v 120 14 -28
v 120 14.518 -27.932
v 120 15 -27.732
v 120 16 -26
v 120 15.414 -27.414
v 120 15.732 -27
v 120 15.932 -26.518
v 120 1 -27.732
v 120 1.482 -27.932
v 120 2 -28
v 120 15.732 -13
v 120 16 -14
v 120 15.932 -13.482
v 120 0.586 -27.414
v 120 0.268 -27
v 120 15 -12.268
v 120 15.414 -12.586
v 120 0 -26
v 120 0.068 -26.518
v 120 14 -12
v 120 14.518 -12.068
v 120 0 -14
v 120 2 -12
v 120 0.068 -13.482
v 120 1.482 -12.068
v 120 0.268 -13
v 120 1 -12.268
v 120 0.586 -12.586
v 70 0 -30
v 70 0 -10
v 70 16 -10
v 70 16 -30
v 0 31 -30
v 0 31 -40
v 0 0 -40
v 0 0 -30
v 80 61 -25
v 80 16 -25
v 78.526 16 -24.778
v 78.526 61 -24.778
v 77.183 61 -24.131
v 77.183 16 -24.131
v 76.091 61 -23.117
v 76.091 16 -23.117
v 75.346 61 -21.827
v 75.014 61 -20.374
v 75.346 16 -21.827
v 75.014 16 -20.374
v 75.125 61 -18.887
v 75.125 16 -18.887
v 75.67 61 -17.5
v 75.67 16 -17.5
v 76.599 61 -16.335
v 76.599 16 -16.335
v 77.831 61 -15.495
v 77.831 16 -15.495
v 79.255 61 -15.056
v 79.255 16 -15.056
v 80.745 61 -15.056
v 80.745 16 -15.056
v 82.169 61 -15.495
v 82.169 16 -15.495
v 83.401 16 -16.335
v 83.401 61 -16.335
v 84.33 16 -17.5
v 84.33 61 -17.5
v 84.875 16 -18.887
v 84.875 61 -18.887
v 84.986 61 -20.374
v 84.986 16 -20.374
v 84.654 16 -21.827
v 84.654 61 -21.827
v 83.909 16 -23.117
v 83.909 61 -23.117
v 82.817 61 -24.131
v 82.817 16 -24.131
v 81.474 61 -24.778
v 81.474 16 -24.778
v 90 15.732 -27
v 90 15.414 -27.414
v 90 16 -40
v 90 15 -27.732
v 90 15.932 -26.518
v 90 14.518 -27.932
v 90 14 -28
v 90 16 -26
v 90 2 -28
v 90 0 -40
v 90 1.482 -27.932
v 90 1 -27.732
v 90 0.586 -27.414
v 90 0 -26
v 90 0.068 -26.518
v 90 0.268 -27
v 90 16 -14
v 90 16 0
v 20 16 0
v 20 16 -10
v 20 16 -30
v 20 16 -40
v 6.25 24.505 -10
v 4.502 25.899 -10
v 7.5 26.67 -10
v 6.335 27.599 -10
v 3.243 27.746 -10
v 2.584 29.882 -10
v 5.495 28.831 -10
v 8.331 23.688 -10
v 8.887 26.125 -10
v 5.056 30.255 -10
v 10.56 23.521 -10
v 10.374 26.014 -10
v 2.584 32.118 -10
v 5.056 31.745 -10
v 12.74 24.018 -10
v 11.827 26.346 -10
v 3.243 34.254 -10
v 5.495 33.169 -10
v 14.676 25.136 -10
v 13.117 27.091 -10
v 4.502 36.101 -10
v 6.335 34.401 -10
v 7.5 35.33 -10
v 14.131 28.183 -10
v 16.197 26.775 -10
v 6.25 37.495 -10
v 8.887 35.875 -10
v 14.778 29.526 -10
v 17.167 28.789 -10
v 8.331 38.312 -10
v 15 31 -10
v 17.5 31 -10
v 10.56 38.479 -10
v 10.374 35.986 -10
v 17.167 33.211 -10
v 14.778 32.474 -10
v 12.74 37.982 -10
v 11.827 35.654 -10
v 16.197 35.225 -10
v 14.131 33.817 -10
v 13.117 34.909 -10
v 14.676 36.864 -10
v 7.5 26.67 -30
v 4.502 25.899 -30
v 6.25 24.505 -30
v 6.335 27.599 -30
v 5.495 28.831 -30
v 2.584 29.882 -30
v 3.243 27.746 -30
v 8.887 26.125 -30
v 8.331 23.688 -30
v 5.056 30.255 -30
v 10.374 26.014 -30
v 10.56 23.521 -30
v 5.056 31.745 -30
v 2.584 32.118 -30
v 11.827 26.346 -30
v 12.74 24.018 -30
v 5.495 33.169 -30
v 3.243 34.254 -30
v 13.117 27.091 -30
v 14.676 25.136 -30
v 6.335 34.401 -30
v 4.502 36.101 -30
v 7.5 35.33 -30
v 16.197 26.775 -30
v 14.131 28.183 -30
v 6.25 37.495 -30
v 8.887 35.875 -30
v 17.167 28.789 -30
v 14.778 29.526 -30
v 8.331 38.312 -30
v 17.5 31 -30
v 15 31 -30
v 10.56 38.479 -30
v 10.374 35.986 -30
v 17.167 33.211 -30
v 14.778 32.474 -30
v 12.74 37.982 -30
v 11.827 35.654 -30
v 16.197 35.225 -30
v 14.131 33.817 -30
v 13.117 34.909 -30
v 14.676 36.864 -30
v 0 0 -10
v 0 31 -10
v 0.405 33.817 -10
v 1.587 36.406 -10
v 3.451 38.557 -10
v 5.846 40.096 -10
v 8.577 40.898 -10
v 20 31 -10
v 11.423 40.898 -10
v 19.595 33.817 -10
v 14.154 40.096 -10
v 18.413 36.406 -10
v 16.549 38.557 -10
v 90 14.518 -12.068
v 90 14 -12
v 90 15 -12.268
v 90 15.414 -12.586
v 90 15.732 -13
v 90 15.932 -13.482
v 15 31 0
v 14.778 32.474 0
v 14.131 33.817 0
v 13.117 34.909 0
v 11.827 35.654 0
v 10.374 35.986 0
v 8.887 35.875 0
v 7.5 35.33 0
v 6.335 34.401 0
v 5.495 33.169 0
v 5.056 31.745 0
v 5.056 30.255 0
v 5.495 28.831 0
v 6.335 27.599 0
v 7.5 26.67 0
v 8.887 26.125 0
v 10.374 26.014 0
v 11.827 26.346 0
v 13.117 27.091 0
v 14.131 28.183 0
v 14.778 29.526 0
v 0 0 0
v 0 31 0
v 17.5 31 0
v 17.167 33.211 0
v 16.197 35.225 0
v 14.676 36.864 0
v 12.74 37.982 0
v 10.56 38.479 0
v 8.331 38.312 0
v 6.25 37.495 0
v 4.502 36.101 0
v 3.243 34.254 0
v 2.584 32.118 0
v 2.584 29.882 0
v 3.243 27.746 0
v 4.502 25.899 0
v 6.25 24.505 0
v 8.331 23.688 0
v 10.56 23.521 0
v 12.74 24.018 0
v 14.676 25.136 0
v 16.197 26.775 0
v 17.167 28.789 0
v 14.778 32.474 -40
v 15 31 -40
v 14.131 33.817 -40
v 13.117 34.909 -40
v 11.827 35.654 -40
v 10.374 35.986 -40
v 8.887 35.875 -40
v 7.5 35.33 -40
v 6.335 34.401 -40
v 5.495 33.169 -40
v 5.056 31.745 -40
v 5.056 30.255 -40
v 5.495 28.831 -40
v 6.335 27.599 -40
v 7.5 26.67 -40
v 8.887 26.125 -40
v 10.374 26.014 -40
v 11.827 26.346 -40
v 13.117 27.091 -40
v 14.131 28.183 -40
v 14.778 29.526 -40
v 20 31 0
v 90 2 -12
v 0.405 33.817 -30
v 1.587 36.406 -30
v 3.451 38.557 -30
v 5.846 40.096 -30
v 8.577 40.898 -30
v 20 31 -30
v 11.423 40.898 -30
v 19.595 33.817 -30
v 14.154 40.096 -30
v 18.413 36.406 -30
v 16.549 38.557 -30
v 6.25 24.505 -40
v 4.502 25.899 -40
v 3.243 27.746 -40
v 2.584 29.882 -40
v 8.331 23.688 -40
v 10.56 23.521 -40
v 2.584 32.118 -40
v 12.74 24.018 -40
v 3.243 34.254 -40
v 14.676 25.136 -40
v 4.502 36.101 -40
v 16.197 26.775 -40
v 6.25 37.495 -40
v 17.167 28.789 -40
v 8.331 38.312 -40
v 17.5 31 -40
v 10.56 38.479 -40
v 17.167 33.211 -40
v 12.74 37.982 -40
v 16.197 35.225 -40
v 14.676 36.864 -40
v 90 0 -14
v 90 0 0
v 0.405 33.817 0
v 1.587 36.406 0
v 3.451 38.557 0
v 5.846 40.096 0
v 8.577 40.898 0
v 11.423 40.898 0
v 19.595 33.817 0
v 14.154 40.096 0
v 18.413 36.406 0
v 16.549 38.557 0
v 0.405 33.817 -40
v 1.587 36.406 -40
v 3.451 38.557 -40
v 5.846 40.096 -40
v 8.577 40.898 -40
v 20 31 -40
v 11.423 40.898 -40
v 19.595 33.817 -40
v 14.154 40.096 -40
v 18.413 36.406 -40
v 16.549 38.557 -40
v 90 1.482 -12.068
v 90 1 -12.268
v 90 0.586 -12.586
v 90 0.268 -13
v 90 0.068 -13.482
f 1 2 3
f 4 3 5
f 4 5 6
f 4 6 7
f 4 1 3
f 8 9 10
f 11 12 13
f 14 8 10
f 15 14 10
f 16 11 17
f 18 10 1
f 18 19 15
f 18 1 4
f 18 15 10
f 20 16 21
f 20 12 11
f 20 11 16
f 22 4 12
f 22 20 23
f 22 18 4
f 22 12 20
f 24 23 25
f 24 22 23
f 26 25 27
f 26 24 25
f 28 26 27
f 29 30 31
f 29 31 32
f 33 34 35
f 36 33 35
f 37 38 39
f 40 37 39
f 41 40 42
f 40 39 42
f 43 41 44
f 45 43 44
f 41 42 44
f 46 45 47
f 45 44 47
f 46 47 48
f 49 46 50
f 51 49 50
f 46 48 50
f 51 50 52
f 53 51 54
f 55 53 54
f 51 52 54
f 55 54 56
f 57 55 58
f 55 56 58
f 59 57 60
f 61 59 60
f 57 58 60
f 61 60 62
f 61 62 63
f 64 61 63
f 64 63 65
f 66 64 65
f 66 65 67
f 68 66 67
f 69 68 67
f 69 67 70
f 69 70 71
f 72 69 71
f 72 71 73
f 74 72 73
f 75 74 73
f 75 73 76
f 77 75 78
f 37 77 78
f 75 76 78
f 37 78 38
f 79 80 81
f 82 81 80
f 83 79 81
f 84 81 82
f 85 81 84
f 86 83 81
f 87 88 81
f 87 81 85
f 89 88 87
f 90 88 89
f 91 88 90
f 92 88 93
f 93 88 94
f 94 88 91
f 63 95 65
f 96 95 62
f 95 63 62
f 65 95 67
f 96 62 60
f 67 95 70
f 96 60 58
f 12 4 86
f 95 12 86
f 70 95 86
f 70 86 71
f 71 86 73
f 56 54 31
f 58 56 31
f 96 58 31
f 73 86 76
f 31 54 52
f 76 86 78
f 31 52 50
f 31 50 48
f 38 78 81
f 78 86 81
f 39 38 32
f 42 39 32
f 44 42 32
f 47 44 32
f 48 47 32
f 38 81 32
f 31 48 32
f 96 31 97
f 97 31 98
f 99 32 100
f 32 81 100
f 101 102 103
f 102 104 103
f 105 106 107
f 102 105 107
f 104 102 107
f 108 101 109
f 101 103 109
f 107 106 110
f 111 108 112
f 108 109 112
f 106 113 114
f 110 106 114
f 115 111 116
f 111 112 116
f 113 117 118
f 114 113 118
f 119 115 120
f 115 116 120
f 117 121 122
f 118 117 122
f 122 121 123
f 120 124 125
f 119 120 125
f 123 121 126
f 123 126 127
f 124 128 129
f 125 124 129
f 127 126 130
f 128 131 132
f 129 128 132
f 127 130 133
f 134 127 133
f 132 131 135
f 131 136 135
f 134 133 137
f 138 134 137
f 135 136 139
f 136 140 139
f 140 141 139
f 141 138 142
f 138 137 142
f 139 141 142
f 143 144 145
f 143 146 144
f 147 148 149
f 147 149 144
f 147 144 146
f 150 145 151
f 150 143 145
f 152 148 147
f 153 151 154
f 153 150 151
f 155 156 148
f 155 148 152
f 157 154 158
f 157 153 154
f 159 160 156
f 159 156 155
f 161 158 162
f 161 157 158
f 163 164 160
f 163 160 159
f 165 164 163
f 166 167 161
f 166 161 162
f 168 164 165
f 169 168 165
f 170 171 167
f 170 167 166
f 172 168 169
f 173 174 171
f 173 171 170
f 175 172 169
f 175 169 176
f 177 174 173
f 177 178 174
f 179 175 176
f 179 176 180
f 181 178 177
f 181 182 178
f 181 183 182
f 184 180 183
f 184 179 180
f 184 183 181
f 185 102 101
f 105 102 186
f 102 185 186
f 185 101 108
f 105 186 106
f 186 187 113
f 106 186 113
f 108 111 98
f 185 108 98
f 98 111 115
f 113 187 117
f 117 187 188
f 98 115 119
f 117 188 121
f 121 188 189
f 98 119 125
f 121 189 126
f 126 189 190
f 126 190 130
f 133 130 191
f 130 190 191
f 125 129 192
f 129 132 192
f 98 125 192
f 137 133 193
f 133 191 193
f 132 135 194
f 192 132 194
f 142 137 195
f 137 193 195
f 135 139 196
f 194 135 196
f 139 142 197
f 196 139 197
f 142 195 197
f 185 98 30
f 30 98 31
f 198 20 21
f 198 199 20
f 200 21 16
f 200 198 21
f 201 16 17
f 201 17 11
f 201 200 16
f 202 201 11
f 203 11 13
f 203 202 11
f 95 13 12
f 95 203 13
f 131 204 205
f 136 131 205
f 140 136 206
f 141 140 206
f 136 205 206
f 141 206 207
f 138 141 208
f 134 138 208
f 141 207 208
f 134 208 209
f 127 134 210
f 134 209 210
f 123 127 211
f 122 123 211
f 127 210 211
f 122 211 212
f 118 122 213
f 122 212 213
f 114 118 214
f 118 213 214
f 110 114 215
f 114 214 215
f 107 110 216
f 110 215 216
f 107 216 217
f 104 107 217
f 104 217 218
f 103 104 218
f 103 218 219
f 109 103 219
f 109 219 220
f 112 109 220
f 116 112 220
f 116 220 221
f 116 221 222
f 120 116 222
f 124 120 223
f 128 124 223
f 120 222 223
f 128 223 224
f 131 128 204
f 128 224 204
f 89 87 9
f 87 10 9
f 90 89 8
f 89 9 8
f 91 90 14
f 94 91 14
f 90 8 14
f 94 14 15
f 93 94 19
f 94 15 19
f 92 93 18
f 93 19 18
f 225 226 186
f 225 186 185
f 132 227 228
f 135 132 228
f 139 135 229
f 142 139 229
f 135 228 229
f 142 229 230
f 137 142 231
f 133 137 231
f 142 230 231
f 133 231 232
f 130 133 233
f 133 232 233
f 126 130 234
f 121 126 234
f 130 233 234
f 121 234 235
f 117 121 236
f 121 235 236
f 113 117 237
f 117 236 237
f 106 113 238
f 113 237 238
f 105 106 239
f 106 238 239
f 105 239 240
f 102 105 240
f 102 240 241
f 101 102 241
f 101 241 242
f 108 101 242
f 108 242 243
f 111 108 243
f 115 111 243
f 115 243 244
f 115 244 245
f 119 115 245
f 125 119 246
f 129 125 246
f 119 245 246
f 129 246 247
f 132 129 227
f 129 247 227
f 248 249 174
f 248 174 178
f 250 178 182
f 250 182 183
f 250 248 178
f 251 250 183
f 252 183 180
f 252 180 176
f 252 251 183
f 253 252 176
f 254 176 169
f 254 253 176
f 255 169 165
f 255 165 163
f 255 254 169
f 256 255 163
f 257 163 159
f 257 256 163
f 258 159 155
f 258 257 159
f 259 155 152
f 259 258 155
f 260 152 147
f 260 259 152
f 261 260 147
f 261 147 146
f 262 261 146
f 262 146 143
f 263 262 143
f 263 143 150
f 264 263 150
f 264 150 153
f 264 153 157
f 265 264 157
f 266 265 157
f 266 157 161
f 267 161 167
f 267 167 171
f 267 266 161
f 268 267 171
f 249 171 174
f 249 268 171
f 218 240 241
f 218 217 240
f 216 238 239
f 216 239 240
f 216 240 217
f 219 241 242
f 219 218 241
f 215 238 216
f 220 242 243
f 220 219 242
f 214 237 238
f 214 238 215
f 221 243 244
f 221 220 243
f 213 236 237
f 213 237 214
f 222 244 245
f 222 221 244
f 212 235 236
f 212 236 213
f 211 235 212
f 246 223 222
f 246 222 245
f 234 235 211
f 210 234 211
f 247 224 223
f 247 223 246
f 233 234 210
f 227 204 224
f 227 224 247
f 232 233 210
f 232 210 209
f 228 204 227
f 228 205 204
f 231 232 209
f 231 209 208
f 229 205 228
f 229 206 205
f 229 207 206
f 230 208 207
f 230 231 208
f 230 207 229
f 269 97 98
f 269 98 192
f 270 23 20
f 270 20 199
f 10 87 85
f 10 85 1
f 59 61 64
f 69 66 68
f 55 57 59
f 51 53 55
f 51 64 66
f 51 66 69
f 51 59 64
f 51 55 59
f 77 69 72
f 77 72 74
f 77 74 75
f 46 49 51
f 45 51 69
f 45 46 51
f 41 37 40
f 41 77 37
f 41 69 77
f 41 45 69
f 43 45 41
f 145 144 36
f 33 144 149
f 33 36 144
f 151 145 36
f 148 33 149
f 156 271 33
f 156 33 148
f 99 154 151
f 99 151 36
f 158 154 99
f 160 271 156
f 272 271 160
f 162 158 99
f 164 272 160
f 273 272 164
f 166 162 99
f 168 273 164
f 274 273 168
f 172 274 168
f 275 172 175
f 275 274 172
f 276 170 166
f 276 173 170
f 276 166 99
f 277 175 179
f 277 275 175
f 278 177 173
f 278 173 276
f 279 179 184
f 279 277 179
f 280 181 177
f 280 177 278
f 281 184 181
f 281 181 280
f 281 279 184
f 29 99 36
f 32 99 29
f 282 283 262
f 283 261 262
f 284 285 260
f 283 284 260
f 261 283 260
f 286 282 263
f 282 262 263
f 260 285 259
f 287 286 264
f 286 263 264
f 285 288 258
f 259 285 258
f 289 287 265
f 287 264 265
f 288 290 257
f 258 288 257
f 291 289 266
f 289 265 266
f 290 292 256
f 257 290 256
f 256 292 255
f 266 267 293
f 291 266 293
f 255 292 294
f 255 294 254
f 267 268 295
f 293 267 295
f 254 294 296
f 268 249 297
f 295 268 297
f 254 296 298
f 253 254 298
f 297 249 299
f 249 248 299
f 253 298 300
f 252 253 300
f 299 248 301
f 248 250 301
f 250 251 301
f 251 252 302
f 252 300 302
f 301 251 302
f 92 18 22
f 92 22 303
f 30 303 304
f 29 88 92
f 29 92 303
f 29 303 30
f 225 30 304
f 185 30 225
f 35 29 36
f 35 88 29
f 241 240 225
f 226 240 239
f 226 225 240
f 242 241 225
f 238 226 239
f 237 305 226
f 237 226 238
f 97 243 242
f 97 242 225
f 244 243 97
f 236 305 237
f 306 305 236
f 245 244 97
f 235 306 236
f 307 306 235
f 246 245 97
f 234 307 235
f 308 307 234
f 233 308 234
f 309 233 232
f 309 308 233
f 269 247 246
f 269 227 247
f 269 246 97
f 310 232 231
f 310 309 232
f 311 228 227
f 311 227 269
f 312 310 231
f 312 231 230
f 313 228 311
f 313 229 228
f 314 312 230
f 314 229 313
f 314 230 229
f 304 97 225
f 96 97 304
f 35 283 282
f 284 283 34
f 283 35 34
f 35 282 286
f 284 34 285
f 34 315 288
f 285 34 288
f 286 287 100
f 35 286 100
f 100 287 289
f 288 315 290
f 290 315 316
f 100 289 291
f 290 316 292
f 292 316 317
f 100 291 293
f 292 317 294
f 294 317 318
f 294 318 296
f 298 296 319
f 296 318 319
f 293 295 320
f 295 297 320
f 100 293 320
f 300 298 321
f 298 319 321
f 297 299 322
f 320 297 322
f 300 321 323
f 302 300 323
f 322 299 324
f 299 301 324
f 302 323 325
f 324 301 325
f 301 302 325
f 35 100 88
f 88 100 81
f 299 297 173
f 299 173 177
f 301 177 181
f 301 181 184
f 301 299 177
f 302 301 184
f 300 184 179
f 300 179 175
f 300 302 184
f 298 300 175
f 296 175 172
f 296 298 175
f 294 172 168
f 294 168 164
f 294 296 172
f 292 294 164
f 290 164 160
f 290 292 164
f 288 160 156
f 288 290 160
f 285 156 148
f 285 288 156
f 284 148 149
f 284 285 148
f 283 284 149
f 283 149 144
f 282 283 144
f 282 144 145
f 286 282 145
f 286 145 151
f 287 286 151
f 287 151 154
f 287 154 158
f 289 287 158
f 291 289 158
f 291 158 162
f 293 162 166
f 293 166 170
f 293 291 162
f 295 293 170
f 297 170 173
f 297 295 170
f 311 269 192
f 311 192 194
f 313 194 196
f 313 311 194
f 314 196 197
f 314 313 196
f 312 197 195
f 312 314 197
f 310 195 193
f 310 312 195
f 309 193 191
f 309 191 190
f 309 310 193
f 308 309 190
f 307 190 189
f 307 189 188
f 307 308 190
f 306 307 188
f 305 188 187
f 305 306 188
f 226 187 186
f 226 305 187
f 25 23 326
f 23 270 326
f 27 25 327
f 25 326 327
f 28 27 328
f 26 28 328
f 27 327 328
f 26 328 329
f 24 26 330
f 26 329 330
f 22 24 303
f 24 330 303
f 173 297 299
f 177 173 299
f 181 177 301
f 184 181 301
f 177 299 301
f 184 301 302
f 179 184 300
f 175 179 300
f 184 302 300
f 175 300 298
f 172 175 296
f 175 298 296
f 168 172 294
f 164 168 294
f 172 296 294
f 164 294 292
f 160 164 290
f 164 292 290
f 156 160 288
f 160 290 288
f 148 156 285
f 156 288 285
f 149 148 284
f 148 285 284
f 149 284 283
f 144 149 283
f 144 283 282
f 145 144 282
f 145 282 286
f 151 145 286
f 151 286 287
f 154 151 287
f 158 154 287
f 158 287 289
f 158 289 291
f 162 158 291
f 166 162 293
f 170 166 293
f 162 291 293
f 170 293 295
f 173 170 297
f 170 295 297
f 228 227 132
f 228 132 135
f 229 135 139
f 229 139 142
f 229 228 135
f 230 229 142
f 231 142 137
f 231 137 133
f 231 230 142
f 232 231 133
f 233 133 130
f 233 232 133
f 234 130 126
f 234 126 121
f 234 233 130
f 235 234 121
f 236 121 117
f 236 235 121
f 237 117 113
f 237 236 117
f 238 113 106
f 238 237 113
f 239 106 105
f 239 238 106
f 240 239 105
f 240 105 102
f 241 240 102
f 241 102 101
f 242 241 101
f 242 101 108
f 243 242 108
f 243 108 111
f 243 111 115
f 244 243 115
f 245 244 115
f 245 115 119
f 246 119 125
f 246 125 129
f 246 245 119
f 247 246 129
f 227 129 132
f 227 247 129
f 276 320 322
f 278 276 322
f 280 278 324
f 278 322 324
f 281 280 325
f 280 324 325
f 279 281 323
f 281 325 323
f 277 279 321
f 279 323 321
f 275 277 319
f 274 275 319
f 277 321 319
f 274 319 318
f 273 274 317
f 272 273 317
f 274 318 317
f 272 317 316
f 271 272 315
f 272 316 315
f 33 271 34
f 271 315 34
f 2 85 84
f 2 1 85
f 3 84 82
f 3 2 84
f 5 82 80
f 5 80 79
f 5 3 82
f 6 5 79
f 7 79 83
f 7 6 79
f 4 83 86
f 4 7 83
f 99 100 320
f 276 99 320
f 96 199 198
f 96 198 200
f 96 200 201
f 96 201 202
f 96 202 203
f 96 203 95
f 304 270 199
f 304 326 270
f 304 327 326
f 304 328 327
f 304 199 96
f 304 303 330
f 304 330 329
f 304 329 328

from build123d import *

# Parameters (mm, degrees)
BOSS_EXTRUDE1_DEPTH   = 16
FILLET1_R             = 2
SKETCH3_R             = 7.5
BOSS_EXTRUDE2_DEPTH   = 10
SKETCH4_R             = 5
BOSS_EXTRUDE3_DEPTH   = 45
SKETCH5_R             = 7.5
SKETCH5_R_2           = 5
BOSS_EXTRUDE4_DEPTH   = 10
LPATTERN1_START       = -40
LPATTERN1_OUTLINE_R   = 7.5
LPATTERN1_OUTLINE_R_2 = 5
LPATTERN1_DEPTH       = 10
LPATTERN1_2_OUTLINE_R = 7.5
LPATTERN1_2_DEPTH     = 10


# Read off the part's stored shape, not the designer's step: LPattern1
with BuildPart() as part:
    # Sketch2 → Boss-Extrude1 (new body)
    with BuildSketch(Plane(origin=(0, 0, 0), x_dir=(1, 0, 0), z_dir=(0, 1, 0))):
        Polygon((0, 30), (0, 40), (90, 40), (90, 28), (120, 28), (120, 12), (90, 12), (90, 0), (0, 0), (0, 10), (70, 10), (70, 30), align=None)
    extrude(amount=BOSS_EXTRUDE1_DEPTH)

    # Fillet1
    fillet1_edges = [part.edges().sort_by_distance(p)[0] for p in [
        (105, 16, -12),
        (105, 0, -28),
        (105, 0, -12),
        (105, 16, -28),
    ]]
    fillet(fillet1_edges, radius=FILLET1_R)

    # Sketch3 → Boss-Extrude2 (add)
    with BuildSketch(Plane.XY):
        with BuildLine():
            Line((0, 16), (20, 16))
            Line((20, 16), (20, 31))
            ThreePointArc((20, 31), (10, 41), (0, 31))
            Line((0, 31), (0, 16))
        make_face()
        with Locations((10, 31)):
            Circle(SKETCH3_R, mode=Mode.SUBTRACT)
    extrude(amount=-BOSS_EXTRUDE2_DEPTH)

    # Sketch4 → Boss-Extrude3 (add)
    with BuildSketch(Plane(origin=(0, 16, 0), x_dir=(1, 0, 0), z_dir=(0, 1, 0))):
        with Locations(Location((80, 20, 0), (0, 0, 90))):
            Circle(SKETCH4_R)
    extrude(amount=BOSS_EXTRUDE3_DEPTH)

    # LPattern1 2 outline → LPattern1 2 (add)
    with BuildSketch(Plane.XY.offset(LPATTERN1_START)):
        with BuildLine():
            Line((0, 31), (0, 16))
            Line((0, 16), (20, 16))
            Line((20, 16), (20, 31))
            ThreePointArc((20, 31), (10, 41), (0, 31))
        make_face()
        with Locations((10, 31)):
            Circle(LPATTERN1_2_OUTLINE_R, mode=Mode.SUBTRACT)
    extrude(amount=LPATTERN1_2_DEPTH)


with BuildPart() as body_2:
    # Sketch5 → Boss-Extrude4 (new body)
    with BuildSketch(Plane.XY):
        with Locations((10, 31)):
            Circle(SKETCH5_R)
        with Locations((10, 31)):
            Circle(SKETCH5_R_2, mode=Mode.SUBTRACT)
    extrude(amount=-BOSS_EXTRUDE4_DEPTH)


with BuildPart() as body_3:
    # LPattern1 outline → LPattern1 (new body)
    with BuildSketch(Plane.XY.offset(LPATTERN1_START)):
        with Locations((10, 31)):
            Circle(LPATTERN1_OUTLINE_R)
        with Locations((10, 31)):
            Circle(LPATTERN1_OUTLINE_R_2, mode=Mode.SUBTRACT)
    extrude(amount=LPATTERN1_DEPTH)


solid = Compound([part.part, body_2.part, body_3.part])
